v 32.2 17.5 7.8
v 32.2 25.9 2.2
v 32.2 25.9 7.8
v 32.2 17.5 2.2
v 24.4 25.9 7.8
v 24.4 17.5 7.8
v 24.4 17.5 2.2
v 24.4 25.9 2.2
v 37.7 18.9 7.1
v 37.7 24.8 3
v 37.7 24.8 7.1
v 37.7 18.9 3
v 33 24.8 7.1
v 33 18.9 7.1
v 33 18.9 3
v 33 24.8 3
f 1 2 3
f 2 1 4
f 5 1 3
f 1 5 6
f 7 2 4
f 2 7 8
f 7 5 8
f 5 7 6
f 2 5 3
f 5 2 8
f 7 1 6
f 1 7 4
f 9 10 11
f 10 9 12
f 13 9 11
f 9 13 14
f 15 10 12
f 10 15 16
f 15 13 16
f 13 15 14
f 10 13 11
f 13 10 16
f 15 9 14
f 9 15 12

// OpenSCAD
union() {
  translate([24.4, 17.5, 2.2]) cube(size=[7.8,8.4,5.6], center=false);
  translate([33.0, 18.9, 3.0]) cube(size=[4.7,5.9,4.1], center=false);
}
